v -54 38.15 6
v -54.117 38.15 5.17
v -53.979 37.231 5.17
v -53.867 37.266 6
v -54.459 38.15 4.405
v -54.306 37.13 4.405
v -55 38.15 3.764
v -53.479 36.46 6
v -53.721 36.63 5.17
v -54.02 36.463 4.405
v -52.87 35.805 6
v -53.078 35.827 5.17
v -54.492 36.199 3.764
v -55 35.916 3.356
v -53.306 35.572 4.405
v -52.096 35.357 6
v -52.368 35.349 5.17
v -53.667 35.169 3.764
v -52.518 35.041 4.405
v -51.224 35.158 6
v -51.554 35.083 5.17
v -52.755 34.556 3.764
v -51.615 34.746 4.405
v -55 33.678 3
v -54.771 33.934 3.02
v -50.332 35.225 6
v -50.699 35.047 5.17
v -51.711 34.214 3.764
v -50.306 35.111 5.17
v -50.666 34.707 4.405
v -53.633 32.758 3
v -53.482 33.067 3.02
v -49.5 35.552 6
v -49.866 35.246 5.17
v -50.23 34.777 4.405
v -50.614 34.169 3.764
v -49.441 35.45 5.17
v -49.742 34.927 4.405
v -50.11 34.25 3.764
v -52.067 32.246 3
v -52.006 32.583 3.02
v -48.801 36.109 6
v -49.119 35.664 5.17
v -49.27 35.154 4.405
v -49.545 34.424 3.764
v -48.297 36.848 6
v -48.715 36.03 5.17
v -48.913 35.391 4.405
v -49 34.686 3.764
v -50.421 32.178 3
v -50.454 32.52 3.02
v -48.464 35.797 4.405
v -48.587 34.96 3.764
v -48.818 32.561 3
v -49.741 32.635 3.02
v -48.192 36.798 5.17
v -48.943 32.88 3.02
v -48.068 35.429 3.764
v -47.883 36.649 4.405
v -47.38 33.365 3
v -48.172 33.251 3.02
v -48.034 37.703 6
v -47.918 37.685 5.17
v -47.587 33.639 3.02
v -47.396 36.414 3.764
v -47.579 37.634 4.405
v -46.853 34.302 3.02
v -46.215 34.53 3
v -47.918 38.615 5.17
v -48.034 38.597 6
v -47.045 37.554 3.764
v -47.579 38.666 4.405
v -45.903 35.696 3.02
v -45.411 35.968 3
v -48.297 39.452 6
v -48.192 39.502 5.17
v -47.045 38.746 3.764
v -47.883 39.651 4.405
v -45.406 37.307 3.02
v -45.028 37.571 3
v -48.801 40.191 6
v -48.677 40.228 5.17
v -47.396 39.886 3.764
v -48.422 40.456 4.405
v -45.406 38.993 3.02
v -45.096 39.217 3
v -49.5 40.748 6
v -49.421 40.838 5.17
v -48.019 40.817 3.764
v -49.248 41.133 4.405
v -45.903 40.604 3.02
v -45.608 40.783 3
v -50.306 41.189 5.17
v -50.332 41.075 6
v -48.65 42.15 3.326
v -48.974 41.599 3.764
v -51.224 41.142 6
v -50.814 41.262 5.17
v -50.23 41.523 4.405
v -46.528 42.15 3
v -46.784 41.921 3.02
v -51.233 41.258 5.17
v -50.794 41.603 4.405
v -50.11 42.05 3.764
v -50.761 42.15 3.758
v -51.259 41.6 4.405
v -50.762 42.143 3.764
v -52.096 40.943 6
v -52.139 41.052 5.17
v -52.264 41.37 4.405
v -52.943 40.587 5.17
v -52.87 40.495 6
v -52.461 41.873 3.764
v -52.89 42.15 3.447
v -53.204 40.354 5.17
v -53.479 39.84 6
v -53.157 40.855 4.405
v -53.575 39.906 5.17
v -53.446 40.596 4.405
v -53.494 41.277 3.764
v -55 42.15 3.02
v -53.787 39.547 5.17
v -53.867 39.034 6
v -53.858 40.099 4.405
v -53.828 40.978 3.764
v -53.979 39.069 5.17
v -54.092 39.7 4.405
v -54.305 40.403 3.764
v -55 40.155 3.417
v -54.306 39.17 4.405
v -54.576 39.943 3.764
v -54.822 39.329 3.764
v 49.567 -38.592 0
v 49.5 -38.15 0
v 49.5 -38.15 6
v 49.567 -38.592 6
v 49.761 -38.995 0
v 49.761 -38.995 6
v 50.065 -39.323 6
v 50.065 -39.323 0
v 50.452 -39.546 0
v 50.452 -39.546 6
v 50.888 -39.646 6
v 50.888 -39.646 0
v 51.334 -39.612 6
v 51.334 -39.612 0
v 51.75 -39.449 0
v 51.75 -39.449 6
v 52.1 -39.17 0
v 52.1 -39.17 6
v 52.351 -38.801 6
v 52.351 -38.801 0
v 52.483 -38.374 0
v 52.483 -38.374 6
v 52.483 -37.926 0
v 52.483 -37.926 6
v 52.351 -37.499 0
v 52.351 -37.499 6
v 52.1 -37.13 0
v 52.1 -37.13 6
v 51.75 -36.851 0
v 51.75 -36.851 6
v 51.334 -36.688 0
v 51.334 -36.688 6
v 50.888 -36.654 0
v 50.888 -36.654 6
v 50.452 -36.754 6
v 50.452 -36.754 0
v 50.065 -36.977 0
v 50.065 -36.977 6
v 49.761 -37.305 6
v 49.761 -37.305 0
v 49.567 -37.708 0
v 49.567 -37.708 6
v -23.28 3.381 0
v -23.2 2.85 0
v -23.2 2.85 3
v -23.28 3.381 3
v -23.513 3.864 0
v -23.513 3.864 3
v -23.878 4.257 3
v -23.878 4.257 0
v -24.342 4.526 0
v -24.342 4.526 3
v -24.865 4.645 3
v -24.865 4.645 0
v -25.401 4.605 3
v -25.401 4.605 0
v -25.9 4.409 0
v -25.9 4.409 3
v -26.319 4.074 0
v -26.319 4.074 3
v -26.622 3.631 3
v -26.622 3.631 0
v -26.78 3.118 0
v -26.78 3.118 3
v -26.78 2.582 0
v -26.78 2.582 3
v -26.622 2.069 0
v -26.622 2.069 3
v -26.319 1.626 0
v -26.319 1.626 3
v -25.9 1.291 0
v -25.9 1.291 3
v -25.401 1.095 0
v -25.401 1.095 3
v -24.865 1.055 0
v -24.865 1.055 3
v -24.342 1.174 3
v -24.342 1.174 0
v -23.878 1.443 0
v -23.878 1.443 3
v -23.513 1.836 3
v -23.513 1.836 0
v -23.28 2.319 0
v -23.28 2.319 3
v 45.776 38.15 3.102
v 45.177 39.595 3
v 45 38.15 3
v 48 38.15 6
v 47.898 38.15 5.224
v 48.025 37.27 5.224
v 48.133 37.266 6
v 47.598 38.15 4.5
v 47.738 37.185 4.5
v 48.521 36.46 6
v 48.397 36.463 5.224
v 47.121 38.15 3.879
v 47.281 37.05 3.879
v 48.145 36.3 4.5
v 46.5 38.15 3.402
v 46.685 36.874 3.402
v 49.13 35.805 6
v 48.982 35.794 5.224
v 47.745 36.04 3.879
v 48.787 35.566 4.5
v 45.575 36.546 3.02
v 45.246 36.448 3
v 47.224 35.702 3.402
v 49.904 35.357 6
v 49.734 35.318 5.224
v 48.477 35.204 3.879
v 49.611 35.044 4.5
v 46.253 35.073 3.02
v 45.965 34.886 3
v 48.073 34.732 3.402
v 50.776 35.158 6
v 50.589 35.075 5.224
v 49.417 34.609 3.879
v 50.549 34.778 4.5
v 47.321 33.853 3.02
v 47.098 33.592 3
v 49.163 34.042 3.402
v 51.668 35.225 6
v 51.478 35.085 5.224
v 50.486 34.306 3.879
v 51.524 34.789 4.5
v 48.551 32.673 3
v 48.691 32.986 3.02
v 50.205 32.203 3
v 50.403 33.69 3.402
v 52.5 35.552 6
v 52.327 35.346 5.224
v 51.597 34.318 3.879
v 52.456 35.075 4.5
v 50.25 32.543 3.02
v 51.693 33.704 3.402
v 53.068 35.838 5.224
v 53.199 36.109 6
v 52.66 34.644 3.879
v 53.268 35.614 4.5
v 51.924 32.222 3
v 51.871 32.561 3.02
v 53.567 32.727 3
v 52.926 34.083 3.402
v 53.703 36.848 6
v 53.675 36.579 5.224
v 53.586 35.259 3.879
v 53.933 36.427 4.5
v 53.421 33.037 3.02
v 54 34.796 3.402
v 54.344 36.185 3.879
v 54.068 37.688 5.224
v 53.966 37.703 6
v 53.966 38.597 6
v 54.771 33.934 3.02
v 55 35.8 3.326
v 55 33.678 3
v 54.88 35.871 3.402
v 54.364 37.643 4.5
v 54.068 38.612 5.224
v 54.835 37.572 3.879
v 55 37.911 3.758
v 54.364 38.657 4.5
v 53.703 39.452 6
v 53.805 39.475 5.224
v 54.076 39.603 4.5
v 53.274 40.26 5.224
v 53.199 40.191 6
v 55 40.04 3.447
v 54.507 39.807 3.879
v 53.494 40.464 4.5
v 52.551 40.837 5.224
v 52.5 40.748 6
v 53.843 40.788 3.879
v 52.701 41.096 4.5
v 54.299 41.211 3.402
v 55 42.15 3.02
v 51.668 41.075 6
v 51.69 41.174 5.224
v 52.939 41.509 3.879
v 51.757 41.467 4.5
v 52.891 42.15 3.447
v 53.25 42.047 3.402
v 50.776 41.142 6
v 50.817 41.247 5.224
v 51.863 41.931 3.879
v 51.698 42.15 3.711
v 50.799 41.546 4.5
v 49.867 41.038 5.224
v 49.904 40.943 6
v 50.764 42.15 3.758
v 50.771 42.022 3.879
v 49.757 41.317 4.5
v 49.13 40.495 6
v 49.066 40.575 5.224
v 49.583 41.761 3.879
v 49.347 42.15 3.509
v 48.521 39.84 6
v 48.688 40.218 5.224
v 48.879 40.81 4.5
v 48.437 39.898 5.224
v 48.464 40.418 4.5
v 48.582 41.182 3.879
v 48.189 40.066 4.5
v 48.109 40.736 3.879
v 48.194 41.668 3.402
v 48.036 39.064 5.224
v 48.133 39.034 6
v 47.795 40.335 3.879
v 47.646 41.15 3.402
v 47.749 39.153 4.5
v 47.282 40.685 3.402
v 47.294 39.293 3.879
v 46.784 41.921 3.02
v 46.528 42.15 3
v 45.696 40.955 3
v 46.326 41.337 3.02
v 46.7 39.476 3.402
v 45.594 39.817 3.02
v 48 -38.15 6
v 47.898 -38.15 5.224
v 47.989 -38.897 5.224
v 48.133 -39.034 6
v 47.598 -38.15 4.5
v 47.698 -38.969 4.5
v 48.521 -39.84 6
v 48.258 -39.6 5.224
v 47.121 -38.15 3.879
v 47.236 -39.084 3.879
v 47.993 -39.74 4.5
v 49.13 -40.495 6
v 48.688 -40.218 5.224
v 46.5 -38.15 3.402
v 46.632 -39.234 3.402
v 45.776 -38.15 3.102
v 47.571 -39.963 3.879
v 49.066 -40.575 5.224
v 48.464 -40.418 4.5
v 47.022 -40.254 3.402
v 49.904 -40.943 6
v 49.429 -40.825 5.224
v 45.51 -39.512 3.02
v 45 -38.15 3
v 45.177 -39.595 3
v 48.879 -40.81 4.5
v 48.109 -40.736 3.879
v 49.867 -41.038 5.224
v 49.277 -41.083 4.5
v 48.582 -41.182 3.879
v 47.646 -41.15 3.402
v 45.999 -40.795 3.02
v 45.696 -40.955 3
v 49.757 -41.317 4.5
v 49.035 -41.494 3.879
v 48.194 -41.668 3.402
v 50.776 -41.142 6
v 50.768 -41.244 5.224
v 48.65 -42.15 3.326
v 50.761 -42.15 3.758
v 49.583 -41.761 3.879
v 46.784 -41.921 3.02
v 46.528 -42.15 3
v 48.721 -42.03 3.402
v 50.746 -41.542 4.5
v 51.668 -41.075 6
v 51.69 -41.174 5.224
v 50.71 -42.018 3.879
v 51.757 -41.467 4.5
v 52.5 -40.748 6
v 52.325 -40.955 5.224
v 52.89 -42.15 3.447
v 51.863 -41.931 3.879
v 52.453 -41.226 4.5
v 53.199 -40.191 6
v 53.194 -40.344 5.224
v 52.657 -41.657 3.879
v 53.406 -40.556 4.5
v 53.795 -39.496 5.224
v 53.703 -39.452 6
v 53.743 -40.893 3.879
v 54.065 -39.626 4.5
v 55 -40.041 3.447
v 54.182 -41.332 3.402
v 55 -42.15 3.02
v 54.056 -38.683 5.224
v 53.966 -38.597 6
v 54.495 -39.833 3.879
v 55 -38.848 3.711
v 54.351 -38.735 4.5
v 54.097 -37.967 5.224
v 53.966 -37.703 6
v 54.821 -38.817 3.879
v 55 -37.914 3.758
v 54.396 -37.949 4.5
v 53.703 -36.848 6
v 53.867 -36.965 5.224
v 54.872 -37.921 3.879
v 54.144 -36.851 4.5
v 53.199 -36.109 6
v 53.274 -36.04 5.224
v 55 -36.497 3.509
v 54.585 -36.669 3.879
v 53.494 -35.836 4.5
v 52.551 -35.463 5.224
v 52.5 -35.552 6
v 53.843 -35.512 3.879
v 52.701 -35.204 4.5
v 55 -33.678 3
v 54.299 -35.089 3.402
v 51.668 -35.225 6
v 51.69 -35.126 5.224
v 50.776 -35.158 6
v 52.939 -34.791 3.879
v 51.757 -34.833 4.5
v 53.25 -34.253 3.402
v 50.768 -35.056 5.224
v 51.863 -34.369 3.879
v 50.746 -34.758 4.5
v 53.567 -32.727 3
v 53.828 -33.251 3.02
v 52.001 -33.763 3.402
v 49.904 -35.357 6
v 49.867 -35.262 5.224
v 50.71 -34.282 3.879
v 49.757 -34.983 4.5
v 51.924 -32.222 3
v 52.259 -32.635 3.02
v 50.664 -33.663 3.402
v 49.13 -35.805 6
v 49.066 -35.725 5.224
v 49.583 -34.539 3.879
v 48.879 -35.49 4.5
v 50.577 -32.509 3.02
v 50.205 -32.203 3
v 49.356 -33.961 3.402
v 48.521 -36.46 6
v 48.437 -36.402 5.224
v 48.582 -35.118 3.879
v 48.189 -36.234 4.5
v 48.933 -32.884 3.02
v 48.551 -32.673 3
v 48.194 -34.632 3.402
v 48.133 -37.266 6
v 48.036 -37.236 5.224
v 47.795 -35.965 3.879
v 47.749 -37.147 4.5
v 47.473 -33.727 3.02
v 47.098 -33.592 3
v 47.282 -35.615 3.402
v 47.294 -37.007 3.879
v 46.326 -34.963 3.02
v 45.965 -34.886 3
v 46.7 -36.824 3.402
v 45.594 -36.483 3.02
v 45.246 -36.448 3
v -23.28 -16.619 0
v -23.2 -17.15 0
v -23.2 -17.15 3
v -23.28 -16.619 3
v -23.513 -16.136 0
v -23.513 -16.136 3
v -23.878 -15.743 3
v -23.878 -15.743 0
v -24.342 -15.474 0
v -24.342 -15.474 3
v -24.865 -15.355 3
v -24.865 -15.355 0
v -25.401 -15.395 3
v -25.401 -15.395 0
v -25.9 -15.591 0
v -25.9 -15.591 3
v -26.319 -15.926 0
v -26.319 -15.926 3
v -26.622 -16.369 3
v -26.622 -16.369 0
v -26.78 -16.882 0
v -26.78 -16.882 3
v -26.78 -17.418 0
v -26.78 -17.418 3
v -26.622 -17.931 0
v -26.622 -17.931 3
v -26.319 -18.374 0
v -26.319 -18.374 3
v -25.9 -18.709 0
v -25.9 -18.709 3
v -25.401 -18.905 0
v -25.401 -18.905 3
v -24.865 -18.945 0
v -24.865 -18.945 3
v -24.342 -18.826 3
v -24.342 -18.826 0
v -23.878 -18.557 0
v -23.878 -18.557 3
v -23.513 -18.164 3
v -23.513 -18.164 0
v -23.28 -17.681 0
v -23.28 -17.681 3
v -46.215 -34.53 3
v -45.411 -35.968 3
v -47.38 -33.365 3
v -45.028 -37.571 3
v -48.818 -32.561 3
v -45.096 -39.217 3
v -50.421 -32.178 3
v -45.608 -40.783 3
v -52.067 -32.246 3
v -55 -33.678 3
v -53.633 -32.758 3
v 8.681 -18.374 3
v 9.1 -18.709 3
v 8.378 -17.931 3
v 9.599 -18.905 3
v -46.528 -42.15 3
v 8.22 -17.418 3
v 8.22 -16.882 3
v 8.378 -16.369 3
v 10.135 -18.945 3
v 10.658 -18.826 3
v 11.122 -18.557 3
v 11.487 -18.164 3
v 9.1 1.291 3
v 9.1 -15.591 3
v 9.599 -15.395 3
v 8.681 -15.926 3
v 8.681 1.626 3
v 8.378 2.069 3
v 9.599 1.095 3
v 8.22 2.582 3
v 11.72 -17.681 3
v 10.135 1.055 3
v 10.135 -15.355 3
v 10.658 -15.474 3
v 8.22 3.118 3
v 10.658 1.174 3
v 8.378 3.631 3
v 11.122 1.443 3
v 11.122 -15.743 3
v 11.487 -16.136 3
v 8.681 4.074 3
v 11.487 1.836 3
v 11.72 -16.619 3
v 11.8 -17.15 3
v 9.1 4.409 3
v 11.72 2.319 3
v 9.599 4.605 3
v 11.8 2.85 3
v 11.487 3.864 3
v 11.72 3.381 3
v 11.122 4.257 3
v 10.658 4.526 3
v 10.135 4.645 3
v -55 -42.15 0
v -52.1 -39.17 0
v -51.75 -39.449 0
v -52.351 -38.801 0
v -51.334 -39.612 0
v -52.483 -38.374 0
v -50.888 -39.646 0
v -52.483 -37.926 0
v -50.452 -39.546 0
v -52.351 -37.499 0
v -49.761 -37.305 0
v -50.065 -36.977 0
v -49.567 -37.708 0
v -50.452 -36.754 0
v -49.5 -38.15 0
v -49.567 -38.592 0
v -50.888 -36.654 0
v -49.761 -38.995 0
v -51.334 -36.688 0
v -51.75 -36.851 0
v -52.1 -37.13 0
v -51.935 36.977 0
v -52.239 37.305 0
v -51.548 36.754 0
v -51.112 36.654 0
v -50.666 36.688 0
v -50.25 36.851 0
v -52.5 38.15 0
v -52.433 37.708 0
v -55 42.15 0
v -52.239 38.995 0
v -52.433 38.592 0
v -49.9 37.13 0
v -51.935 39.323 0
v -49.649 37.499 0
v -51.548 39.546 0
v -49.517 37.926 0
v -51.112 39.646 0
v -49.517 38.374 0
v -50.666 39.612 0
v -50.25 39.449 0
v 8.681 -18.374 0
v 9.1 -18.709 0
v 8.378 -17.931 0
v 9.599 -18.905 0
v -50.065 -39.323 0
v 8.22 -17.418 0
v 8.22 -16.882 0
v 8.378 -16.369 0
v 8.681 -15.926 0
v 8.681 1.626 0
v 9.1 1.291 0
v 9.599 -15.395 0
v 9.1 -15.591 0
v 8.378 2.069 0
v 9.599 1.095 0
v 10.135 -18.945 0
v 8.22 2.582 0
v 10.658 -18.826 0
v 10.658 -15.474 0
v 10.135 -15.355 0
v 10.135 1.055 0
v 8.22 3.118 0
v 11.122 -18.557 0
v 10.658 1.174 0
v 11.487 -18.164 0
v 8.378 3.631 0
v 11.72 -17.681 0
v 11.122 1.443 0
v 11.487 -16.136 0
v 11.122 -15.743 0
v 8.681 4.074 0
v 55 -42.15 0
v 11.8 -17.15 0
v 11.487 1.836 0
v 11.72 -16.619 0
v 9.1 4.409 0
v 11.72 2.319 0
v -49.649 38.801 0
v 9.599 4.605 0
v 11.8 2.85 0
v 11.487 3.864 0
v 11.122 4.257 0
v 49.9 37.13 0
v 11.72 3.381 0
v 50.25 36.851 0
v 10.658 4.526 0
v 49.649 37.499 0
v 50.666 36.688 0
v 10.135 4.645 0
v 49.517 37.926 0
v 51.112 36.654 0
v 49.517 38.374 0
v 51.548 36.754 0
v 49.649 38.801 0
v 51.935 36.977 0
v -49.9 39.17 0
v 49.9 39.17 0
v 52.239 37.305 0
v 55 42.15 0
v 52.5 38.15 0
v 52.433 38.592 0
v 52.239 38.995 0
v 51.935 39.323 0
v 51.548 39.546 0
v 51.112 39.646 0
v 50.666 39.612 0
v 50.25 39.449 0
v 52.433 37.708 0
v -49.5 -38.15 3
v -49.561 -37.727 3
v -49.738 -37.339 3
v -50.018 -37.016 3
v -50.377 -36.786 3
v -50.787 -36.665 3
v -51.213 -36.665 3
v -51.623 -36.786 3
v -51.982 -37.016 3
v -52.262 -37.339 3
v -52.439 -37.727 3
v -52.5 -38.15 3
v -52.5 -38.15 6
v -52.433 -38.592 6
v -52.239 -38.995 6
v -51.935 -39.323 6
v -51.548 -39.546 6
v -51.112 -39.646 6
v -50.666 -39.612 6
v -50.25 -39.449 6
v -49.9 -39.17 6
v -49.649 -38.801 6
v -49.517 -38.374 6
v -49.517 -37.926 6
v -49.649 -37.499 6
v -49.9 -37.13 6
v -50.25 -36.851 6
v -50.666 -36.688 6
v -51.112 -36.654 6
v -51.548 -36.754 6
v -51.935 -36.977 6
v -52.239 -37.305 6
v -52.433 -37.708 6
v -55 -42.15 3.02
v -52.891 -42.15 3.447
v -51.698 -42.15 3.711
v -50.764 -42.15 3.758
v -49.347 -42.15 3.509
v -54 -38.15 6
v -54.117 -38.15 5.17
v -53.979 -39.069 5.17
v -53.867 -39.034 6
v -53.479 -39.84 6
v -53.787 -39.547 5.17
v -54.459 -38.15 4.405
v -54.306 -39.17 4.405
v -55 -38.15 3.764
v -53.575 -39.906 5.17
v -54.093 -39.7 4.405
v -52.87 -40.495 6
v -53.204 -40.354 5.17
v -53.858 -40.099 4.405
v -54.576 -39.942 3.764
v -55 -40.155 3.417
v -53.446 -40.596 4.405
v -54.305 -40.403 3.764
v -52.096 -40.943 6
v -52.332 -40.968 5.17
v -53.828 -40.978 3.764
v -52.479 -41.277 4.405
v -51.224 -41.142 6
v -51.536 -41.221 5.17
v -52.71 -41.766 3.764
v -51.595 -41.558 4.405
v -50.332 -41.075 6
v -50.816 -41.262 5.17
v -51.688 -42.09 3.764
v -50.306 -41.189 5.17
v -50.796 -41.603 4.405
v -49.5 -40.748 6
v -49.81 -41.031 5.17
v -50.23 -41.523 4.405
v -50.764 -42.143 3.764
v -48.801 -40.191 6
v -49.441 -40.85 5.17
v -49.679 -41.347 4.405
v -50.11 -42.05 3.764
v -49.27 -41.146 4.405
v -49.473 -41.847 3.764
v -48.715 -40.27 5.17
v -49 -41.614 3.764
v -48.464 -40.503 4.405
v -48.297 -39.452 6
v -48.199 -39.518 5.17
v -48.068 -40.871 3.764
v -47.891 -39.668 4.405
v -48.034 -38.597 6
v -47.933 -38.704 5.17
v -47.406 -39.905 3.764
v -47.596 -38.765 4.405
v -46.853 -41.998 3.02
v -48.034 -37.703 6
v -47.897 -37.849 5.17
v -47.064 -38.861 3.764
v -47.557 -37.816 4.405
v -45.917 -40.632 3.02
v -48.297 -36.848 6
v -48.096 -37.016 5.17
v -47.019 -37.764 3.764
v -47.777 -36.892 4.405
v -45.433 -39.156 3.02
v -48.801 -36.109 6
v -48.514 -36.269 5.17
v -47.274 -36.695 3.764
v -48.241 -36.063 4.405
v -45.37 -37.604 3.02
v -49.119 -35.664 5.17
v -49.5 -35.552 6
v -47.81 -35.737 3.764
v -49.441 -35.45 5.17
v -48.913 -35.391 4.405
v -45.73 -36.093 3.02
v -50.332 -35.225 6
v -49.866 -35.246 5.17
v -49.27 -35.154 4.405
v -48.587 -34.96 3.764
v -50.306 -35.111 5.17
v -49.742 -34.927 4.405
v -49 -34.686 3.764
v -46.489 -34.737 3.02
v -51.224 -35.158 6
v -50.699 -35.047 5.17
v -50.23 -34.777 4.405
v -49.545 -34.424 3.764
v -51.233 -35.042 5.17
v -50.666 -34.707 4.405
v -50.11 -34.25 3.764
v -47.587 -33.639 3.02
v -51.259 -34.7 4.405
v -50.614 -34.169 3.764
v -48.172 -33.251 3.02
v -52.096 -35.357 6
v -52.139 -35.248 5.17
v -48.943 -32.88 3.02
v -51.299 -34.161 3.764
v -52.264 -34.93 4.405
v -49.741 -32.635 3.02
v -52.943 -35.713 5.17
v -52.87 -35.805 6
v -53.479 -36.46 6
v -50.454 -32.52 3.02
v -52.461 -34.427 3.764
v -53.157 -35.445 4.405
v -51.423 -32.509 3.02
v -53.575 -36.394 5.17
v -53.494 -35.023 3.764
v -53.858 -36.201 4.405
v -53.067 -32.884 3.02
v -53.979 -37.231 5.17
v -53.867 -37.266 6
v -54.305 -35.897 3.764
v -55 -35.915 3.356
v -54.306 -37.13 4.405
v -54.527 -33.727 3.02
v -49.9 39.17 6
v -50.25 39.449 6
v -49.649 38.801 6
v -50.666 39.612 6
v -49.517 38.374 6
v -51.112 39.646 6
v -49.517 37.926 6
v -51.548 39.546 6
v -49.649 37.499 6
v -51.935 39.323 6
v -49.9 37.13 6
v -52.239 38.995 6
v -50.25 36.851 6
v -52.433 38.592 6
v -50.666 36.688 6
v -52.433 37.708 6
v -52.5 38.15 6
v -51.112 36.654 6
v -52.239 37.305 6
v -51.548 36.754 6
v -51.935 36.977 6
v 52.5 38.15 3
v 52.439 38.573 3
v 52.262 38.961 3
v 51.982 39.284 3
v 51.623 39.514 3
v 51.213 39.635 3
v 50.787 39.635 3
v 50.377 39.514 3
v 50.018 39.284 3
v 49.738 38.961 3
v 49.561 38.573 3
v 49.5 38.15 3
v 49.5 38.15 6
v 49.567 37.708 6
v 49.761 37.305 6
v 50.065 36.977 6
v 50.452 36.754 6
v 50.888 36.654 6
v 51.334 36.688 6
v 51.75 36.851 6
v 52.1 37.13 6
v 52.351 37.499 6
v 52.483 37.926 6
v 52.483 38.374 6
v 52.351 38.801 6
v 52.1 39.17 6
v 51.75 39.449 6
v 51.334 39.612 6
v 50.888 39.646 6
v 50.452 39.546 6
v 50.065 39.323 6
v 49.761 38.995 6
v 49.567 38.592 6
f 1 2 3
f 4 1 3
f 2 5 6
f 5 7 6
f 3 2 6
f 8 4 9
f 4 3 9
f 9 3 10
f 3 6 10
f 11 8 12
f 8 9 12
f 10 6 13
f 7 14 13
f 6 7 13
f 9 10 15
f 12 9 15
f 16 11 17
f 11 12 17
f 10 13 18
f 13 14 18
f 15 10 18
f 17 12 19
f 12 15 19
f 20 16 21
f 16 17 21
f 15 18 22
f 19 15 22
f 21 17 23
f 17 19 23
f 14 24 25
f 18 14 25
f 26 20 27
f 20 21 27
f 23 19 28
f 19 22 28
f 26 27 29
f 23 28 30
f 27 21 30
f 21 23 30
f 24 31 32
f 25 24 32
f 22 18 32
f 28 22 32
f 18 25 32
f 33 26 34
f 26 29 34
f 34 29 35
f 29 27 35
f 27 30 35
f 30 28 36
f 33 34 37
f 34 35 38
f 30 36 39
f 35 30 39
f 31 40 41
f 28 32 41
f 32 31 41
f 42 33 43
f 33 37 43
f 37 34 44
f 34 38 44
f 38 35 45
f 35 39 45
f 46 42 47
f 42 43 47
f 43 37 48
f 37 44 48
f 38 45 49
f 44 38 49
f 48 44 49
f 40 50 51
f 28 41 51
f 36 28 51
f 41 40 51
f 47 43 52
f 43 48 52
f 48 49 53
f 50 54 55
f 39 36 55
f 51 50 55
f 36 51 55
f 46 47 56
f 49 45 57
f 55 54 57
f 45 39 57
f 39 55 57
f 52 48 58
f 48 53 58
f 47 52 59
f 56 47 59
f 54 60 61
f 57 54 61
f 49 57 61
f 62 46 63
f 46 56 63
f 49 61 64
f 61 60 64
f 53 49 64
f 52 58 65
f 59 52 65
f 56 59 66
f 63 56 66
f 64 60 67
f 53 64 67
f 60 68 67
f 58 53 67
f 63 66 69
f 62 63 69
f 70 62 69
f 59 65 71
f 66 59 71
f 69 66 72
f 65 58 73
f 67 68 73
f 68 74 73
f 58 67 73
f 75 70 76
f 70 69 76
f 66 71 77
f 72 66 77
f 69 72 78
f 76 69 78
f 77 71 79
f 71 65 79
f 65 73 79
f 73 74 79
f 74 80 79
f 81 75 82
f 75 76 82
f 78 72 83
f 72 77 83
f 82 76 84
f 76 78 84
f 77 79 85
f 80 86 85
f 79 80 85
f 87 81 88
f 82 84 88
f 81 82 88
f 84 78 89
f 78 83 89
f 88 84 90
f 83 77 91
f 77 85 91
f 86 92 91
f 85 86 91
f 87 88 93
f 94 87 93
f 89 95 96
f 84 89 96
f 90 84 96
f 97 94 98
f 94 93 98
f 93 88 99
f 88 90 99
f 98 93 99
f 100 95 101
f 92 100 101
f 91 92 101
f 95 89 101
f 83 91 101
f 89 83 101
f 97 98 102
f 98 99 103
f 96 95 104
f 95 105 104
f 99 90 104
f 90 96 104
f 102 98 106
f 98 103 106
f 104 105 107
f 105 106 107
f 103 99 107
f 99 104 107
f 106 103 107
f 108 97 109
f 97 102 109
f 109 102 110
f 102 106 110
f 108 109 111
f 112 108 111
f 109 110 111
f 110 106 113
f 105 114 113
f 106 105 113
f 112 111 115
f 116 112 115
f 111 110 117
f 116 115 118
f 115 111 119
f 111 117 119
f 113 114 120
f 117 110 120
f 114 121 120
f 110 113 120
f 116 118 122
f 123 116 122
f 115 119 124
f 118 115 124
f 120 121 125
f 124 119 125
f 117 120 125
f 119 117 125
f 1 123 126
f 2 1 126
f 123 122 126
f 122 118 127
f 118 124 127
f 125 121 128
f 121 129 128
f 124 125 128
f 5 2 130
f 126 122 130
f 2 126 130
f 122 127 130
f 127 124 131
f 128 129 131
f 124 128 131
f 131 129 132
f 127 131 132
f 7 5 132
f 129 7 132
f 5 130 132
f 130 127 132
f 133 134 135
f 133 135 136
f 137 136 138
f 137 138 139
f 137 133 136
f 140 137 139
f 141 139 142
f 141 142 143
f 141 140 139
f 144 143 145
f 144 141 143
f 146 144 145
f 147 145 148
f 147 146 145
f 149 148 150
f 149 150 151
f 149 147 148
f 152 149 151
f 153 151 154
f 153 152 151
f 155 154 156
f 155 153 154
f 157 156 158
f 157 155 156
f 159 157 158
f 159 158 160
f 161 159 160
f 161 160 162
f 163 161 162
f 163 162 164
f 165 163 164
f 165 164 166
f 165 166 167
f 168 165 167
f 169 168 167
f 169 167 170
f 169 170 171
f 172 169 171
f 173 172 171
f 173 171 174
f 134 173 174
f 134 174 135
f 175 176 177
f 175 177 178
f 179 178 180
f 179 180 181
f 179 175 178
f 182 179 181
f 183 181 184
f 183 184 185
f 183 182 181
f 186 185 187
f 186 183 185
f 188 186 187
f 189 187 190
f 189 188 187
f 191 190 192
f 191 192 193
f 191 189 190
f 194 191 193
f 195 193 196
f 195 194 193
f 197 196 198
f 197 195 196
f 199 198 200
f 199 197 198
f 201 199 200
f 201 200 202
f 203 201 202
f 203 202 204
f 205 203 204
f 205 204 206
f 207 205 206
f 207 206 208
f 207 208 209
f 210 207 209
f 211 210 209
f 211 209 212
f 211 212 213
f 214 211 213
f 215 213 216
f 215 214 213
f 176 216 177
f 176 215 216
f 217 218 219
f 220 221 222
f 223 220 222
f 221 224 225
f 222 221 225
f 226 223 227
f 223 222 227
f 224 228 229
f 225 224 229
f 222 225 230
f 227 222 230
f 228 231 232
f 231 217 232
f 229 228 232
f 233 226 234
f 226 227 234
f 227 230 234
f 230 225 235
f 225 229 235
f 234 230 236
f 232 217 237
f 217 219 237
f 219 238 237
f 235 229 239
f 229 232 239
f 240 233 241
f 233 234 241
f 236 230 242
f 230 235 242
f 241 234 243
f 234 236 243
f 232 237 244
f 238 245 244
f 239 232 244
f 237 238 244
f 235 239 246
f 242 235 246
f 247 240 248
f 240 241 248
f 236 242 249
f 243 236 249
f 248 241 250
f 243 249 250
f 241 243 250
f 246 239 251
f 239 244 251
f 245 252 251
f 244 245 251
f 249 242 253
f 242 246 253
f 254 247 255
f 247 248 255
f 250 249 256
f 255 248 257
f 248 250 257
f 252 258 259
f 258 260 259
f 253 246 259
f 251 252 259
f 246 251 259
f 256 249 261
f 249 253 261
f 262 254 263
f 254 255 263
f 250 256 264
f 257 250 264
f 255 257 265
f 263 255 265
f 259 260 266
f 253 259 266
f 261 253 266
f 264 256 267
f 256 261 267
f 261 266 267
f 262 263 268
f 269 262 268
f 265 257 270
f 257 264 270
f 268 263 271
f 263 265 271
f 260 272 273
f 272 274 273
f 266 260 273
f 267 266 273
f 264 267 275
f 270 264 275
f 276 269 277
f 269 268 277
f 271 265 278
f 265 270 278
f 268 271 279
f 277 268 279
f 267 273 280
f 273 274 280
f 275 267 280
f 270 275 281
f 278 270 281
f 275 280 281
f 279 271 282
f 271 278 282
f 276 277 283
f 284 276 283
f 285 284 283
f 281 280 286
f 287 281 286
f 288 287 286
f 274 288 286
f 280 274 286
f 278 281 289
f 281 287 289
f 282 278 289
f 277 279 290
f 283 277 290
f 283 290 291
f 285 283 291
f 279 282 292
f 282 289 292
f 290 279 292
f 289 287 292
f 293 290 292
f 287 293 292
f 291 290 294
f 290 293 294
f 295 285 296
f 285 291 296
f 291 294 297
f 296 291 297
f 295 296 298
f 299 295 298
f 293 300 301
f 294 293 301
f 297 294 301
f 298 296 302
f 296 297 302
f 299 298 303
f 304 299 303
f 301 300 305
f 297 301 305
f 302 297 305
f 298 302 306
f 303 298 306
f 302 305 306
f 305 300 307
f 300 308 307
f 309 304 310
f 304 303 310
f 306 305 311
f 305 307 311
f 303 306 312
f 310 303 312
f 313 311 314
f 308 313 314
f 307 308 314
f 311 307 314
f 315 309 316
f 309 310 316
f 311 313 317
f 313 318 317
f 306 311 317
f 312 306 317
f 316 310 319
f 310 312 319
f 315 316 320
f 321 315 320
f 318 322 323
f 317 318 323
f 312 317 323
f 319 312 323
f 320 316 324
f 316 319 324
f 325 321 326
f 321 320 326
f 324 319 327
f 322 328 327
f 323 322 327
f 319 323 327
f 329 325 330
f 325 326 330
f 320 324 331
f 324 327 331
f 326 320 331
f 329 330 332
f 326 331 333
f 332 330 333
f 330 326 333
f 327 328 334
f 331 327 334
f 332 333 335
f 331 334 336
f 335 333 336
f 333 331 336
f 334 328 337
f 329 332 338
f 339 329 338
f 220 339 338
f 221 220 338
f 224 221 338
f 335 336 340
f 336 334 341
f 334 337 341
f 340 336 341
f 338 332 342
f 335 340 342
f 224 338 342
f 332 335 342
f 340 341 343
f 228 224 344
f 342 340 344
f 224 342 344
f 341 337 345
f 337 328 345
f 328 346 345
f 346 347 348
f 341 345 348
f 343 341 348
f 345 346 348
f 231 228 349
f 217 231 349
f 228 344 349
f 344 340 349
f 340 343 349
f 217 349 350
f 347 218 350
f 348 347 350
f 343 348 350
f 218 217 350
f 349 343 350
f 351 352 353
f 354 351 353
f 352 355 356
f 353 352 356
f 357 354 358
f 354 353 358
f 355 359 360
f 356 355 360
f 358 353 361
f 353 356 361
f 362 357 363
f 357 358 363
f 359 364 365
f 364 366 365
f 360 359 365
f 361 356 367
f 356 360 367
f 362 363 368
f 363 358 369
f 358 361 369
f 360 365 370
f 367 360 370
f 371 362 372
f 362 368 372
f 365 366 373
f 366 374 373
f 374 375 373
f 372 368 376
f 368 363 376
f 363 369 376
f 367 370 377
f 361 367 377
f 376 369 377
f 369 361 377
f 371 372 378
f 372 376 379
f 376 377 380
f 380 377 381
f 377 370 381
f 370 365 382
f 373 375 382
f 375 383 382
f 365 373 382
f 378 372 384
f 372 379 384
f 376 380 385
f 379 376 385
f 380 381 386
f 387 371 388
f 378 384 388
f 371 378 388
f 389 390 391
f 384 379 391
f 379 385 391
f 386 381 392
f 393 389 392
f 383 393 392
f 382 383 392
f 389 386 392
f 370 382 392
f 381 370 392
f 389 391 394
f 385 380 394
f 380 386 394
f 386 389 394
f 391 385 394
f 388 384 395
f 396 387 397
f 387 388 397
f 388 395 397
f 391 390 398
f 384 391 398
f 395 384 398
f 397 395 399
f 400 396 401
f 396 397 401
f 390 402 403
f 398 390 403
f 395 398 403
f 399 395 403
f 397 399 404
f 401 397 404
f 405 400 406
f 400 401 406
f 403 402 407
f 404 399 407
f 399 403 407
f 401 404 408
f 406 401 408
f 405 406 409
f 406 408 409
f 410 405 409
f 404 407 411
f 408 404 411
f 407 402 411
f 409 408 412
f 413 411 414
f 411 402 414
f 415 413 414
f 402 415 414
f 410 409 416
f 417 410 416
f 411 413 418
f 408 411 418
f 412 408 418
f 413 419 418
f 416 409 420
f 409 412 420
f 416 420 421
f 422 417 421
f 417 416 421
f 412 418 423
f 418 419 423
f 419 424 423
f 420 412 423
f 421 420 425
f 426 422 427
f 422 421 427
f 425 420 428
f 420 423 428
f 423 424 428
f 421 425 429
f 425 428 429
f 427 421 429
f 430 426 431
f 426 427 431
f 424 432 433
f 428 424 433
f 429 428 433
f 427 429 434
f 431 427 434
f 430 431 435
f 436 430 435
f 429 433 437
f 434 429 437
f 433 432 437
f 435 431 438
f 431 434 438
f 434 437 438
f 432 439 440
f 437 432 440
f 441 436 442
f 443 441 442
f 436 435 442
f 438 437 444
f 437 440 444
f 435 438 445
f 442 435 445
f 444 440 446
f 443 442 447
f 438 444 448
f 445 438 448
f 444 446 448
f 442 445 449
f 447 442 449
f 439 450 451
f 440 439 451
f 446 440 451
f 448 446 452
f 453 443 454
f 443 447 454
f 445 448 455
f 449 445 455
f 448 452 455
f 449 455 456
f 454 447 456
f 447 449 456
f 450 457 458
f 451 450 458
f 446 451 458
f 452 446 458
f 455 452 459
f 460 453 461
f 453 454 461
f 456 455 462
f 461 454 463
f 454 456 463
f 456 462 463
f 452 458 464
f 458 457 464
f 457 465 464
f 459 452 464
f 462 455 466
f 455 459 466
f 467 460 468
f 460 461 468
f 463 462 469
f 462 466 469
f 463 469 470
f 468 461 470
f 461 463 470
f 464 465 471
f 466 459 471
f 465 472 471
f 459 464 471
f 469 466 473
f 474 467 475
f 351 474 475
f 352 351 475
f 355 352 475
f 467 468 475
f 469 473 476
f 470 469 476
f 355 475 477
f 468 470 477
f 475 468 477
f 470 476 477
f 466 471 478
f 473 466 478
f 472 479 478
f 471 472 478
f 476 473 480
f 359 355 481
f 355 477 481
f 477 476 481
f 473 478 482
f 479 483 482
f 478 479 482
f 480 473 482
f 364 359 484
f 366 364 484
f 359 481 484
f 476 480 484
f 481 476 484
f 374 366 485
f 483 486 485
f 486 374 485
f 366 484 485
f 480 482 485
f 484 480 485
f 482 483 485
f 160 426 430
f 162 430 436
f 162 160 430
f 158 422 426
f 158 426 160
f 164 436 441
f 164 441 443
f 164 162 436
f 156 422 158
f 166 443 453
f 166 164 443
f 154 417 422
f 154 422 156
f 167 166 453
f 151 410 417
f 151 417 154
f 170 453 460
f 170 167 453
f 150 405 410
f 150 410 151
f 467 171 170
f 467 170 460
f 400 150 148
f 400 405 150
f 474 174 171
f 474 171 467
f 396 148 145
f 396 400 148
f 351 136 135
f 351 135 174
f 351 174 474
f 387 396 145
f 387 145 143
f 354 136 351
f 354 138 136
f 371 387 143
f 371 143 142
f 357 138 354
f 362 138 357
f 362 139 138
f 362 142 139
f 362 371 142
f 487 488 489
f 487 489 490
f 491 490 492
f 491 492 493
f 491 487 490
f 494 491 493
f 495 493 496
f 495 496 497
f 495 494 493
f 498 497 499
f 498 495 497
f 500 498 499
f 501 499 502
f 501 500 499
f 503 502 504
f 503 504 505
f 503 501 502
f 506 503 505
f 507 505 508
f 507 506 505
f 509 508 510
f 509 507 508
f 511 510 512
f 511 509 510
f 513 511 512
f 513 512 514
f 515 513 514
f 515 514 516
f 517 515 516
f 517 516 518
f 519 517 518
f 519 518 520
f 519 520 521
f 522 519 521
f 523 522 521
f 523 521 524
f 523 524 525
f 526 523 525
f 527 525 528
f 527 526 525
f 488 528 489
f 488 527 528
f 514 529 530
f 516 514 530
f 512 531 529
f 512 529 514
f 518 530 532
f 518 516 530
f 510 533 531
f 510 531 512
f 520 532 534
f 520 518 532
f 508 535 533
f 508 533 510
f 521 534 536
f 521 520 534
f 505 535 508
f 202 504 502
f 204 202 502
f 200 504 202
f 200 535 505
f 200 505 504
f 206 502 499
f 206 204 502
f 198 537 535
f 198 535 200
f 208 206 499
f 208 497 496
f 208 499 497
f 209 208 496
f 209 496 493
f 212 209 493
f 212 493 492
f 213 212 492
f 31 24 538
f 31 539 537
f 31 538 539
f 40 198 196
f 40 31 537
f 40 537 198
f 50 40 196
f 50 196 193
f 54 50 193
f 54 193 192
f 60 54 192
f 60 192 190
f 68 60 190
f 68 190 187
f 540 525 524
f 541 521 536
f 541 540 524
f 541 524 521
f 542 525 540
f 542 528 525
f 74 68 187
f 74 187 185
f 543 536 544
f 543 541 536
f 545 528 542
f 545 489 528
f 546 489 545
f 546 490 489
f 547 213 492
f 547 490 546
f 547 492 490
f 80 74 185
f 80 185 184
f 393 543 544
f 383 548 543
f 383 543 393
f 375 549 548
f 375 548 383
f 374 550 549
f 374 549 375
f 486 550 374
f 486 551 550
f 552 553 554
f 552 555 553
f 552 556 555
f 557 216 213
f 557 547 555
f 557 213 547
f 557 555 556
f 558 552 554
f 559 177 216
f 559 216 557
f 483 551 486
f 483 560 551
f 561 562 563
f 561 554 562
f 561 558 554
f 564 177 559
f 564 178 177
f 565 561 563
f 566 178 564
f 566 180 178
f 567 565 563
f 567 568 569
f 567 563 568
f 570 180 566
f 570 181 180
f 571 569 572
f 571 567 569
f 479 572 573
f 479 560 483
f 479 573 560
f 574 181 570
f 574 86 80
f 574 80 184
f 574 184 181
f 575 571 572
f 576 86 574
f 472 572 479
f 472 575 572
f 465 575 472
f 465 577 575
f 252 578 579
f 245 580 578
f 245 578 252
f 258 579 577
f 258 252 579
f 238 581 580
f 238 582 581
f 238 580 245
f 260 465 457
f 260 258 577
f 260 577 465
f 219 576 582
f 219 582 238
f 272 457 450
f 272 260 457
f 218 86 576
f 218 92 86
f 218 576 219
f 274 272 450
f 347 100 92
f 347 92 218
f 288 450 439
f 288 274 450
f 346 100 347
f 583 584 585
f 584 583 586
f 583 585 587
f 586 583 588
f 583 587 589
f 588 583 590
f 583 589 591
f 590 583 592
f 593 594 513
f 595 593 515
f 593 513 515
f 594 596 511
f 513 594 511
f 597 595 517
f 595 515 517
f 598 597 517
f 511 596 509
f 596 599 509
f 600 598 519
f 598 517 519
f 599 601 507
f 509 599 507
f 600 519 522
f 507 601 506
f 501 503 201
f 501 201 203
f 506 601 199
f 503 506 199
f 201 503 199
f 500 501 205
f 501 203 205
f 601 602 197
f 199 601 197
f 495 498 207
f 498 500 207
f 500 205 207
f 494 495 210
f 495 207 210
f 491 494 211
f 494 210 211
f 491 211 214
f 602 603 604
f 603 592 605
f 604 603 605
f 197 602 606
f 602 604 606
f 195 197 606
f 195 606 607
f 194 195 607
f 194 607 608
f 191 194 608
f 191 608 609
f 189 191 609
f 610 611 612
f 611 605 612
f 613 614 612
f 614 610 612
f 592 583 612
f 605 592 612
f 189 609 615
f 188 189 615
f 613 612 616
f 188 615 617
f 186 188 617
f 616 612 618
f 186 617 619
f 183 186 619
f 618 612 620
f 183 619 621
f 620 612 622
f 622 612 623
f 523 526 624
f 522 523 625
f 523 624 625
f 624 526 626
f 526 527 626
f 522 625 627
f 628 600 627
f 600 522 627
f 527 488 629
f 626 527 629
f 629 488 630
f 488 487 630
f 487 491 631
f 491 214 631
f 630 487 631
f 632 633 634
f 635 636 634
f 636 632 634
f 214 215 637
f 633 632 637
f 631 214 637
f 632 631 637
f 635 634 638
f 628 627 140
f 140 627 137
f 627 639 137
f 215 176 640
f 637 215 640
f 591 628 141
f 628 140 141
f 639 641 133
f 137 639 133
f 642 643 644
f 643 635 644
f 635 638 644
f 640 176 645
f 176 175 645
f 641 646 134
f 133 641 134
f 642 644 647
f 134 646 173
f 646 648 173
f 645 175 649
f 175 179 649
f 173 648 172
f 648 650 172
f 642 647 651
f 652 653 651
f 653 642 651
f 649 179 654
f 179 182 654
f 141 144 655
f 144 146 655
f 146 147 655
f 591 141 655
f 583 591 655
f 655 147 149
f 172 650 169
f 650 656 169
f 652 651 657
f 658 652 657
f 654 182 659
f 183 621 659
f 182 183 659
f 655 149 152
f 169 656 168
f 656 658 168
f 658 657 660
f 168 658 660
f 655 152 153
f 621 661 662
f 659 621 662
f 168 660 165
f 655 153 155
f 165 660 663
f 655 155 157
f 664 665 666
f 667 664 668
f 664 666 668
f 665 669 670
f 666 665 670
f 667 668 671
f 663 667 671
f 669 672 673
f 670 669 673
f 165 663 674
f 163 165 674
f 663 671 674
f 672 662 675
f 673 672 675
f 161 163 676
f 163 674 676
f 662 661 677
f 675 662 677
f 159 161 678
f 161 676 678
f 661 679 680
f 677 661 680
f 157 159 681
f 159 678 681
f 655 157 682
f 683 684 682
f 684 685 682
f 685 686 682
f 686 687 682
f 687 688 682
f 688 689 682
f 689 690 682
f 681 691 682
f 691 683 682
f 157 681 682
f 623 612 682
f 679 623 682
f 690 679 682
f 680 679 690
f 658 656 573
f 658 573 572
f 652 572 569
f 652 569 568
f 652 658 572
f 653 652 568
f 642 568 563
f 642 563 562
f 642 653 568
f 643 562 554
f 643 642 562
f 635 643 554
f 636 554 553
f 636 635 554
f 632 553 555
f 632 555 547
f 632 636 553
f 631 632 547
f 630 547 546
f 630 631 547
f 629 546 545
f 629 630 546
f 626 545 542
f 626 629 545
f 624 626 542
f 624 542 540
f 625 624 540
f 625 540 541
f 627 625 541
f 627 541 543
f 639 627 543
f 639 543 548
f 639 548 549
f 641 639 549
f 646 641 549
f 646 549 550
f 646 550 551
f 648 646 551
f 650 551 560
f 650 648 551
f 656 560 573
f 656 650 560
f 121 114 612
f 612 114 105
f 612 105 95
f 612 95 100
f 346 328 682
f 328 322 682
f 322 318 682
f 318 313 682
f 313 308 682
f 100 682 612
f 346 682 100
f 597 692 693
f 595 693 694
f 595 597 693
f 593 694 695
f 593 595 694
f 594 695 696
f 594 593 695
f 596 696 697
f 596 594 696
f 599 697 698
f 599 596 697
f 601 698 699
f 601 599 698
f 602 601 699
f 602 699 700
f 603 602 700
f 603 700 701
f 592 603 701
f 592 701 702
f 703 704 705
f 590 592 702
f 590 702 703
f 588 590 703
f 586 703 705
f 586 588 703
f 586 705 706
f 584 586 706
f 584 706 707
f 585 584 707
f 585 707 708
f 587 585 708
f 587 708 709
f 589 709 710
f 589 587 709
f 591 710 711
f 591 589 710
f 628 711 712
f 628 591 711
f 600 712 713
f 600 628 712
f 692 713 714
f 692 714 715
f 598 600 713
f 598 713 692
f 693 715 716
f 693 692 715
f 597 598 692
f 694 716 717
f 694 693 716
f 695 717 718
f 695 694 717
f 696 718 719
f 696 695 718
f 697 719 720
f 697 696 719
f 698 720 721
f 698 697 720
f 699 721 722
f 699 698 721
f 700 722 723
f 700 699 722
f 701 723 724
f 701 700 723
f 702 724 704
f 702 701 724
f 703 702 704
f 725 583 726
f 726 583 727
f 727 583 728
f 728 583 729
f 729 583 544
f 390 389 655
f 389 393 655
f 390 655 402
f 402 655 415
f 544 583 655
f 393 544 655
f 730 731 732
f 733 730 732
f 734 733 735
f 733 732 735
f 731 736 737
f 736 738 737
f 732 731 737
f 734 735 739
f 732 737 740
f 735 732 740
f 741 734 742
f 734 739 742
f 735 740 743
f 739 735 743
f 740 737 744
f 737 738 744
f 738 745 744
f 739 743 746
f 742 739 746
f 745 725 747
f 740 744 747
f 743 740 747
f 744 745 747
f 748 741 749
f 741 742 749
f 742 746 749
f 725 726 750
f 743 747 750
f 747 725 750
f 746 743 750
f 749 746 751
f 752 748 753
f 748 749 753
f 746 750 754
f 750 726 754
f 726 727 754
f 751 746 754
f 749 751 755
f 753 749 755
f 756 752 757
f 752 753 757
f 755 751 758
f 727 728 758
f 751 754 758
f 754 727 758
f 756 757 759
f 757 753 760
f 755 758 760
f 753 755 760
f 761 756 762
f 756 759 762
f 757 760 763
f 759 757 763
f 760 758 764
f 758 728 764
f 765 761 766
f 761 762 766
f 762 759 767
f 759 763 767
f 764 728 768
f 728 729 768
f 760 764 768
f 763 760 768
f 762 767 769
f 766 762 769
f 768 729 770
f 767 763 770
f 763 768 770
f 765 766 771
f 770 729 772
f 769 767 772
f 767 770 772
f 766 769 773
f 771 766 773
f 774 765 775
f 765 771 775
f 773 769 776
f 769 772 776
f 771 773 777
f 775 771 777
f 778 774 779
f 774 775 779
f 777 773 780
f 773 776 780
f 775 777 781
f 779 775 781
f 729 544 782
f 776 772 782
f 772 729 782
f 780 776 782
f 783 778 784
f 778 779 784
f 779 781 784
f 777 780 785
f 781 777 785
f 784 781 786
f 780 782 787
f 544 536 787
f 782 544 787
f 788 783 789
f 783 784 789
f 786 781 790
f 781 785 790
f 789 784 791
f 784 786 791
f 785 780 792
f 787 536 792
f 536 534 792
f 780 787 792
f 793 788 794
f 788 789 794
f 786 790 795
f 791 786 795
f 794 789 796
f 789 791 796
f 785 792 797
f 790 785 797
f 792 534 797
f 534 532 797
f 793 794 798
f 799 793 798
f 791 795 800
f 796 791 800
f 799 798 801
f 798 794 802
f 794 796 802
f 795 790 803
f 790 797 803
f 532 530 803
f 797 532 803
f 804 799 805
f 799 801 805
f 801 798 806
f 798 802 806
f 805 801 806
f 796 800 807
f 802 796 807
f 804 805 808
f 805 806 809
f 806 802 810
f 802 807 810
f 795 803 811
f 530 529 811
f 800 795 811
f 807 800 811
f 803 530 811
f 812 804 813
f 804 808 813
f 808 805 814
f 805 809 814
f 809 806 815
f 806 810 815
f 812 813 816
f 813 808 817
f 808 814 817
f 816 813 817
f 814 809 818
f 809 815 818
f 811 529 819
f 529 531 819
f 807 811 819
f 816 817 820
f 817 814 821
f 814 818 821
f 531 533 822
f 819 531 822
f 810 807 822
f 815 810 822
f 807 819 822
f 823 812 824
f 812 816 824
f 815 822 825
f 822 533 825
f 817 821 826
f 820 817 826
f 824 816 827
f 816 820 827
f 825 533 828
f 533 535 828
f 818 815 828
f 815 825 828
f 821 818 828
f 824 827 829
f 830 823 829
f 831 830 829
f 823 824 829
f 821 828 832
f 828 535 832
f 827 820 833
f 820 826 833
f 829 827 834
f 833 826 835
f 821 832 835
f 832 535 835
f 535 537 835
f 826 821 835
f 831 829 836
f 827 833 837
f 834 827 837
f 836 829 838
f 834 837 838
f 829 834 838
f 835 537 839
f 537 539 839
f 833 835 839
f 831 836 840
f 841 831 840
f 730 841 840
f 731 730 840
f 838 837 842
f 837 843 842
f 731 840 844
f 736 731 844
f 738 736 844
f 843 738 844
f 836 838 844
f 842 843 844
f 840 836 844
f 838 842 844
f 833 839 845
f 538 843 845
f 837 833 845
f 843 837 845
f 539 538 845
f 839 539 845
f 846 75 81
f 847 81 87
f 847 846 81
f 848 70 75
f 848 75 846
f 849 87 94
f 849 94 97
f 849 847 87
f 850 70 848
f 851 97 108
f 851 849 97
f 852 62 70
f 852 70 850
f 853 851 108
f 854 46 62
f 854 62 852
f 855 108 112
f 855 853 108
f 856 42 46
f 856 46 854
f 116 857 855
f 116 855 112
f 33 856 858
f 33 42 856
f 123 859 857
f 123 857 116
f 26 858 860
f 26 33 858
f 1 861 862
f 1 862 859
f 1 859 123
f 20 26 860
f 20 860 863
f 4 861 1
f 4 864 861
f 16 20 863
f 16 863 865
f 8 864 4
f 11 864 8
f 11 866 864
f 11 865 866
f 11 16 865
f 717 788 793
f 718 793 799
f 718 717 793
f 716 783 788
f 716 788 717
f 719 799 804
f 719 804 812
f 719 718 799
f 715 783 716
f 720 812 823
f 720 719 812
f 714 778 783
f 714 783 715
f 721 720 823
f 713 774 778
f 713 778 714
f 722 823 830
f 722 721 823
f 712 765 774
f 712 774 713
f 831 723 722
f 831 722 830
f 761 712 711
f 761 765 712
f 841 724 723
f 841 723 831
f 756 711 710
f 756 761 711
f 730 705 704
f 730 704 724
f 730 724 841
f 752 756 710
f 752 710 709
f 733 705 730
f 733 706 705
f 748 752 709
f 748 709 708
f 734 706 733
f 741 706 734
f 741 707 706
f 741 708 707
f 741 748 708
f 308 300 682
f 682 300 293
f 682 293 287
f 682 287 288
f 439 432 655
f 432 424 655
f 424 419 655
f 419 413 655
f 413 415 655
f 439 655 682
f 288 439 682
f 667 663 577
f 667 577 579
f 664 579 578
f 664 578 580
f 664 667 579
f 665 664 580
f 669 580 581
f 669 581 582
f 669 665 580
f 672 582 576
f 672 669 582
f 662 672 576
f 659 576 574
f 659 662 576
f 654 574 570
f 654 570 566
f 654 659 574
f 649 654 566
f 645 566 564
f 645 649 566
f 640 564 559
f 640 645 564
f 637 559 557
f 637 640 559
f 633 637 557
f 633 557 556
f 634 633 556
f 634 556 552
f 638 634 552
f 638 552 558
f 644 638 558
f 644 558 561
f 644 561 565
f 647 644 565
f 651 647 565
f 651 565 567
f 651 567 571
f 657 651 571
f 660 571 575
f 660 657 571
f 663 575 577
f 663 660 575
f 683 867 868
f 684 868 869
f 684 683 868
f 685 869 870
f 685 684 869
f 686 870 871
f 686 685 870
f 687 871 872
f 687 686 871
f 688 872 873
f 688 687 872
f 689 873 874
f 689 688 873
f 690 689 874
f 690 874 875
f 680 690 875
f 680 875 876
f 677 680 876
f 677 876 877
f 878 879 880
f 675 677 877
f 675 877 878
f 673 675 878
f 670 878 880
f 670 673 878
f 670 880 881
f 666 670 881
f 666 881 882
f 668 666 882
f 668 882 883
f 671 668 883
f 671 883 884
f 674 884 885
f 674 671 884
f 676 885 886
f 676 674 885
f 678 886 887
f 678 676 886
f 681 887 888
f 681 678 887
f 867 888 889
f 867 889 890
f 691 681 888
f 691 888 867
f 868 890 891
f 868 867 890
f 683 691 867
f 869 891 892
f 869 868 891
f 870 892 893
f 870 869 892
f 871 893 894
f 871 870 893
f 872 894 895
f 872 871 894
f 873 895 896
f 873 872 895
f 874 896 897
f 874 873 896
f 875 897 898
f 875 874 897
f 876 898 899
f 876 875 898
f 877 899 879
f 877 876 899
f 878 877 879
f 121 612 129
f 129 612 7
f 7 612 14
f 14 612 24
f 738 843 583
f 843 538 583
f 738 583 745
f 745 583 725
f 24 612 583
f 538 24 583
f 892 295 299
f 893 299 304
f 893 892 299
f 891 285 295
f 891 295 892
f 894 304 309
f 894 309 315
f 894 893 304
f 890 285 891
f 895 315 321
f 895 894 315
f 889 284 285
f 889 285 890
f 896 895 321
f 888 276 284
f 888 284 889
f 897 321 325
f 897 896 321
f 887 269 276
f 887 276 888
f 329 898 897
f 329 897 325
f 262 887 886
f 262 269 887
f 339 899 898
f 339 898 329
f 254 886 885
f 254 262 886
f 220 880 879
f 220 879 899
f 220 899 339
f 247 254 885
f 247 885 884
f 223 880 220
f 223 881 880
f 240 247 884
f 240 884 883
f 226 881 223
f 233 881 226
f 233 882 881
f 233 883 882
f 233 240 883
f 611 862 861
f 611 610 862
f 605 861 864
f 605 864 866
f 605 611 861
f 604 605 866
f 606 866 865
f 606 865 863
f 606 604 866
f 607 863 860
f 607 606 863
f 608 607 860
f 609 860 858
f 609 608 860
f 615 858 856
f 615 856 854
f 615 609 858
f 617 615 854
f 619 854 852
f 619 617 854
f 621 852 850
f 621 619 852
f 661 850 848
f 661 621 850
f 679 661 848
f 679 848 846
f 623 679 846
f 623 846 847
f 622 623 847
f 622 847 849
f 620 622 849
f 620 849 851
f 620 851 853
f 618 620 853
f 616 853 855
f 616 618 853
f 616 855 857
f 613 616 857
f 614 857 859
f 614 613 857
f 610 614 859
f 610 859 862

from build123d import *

# Parameters (mm, degrees)
SKETCH1_W           = 110
SKETCH1_H           = 84.3
SKETCH1_R           = 1.5
SKETCH1_R_2         = 1.8
BOSS_EXTRUDE1_DEPTH = 3
BOSS_EXTRUDE2_START = 3
SKETCH2_R           = 3
SKETCH2_R_2         = 1.5
BOSS_EXTRUDE2_DEPTH = 3
FILLET1_R           = 3


with BuildPart() as part:
    # Sketch1 → Boss-Extrude1 (new body)
    with BuildSketch(Plane.XY):
        Rectangle(SKETCH1_W, SKETCH1_H)
        with Locations((51, 38.15)):
            Circle(SKETCH1_R, mode=Mode.SUBTRACT)
        with Locations(Location((-51, 38.15, 0), (0, 0, 180))):
            Circle(SKETCH1_R, mode=Mode.SUBTRACT)
        with Locations(Location((51, -38.15, 0), (0, 0, 180))):
            Circle(SKETCH1_R, mode=Mode.SUBTRACT)
        with Locations((-51, -38.15)):
            Circle(SKETCH1_R, mode=Mode.SUBTRACT)
        with Locations((-25, -17.15)):
            Circle(SKETCH1_R_2, mode=Mode.SUBTRACT)
        with Locations((-25, 2.85)):
            Circle(SKETCH1_R_2, mode=Mode.SUBTRACT)
        with Locations((10, 2.85)):
            Circle(SKETCH1_R_2, mode=Mode.SUBTRACT)
        with Locations((10, -17.15)):
            Circle(SKETCH1_R_2, mode=Mode.SUBTRACT)
    extrude(amount=BOSS_EXTRUDE1_DEPTH)

    # Sketch2 → Boss-Extrude2 (add)
    # profile 1 of 4: a face of its own
    with BuildSketch(Plane.XY.offset(BOSS_EXTRUDE2_START)):
        with Locations(Location((-51, 38.15, 0), (0, 0, 180))):
            Circle(SKETCH2_R)
        with Locations(Location((-51, 38.15, 0), (0, 0, 180))):
            Circle(SKETCH2_R_2, mode=Mode.SUBTRACT)
    # profile 2 of 4: a face of its own
    with BuildSketch(Plane.XY.offset(BOSS_EXTRUDE2_START)):
        with Locations(Location((51, 38.15, 0), (0, 0, 180))):
            Circle(SKETCH2_R)
        with Locations(Location((51, 38.15, 0), (0, 0, 180))):
            Circle(SKETCH2_R_2, mode=Mode.SUBTRACT)
    # profile 3 of 4: a face of its own
    with BuildSketch(Plane.XY.offset(BOSS_EXTRUDE2_START)):
        with Locations(Location((51, -38.15, 0), (0, 0, 180))):
            Circle(SKETCH2_R)
        with Locations(Location((51, -38.15, 0), (0, 0, 180))):
            Circle(SKETCH2_R_2, mode=Mode.SUBTRACT)
    # profile 4 of 4: a face of its own
    with BuildSketch(Plane.XY.offset(BOSS_EXTRUDE2_START)):
        with Locations(Location((-51, -38.15, 0), (0, 0, 180))):
            Circle(SKETCH2_R)
        with Locations(Location((-51, -38.15, 0), (0, 0, 180))):
            Circle(SKETCH2_R_2, mode=Mode.SUBTRACT)
    extrude(amount=BOSS_EXTRUDE2_DEPTH)

    # Fillet1
    # the kernel refuses this fillet: 3 mm, written as the material it adds along each edge
    with BuildSketch(Plane(origin=(-51, 38.15, 3), x_dir=(-1, 0, 0), z_dir=(0, 1, 0))) as fillet1_piece_1_section:
        with BuildLine():
            CenterArc((3 + FILLET1_R, FILLET1_R), FILLET1_R, 180, 90)
            Line((3, FILLET1_R), (3, 0))
            Line((3, 0), (3 + FILLET1_R, 0))
        make_face()
    fillet1_piece_1 = revolve(axis=Axis((-51, 38.15, 3), (0, 0, 1)), mode=Mode.PRIVATE)
    fillet1_piece_1 = split(fillet1_piece_1, bisect_by=Plane(origin=(-55, 38.15, 3.853016367), z_dir=(1, 0, 0)), keep=Keep.TOP, mode=Mode.PRIVATE)
    fillet1_piece_1 = split(fillet1_piece_1, bisect_by=Plane(origin=(-47.146983633, 42.15, 3.853016367), z_dir=(0, -1, 0)), keep=Keep.TOP, mode=Mode.PRIVATE)
    add(fillet1_piece_1)
    with BuildSketch(Plane(origin=(51, 38.15, 3), x_dir=(-1, 0, 0), z_dir=(0, 1, 0))) as fillet1_piece_2_section:
        with BuildLine():
            CenterArc((3 + FILLET1_R, FILLET1_R), FILLET1_R, 180, 90)
            Line((3, FILLET1_R), (3, 0))
            Line((3, 0), (3 + FILLET1_R, 0))
        make_face()
    fillet1_piece_2 = revolve(axis=Axis((51, 38.15, 3), (0, 0, 1)), mode=Mode.PRIVATE)
    fillet1_piece_2 = split(fillet1_piece_2, bisect_by=Plane(origin=(55, 38.15, 3.853016383), z_dir=(-1, 0, 0)), keep=Keep.TOP, mode=Mode.PRIVATE)
    fillet1_piece_2 = split(fillet1_piece_2, bisect_by=Plane(origin=(54.853016383, 42.15, 3.853016383), z_dir=(0, -1, 0)), keep=Keep.TOP, mode=Mode.PRIVATE)
    add(fillet1_piece_2)
    with BuildSketch(Plane(origin=(51, -38.15, 3), x_dir=(-1, 0, 0), z_dir=(0, 1, 0))) as fillet1_piece_3_section:
        with BuildLine():
            CenterArc((3 + FILLET1_R, FILLET1_R), FILLET1_R, 180, 90)
            Line((3, FILLET1_R), (3, 0))
            Line((3, 0), (3 + FILLET1_R, 0))
        make_face()
    fillet1_piece_3 = revolve(axis=Axis((51, -38.15, 3), (0, 0, 1)), mode=Mode.PRIVATE)
    fillet1_piece_3 = split(fillet1_piece_3, bisect_by=Plane(origin=(54.853016382, -42.15, 3.853016382), z_dir=(0, 1, 0)), keep=Keep.TOP, mode=Mode.PRIVATE)
    fillet1_piece_3 = split(fillet1_piece_3, bisect_by=Plane(origin=(55, -38.15, 3.853016382), z_dir=(-1, 0, 0)), keep=Keep.TOP, mode=Mode.PRIVATE)
    add(fillet1_piece_3)
    with BuildSketch(Plane(origin=(-51, -38.15, 3), x_dir=(-1, 0, 0), z_dir=(0, 1, 0))) as fillet1_piece_4_section:
        with BuildLine():
            CenterArc((3 + FILLET1_R, FILLET1_R), FILLET1_R, 180, 90)
            Line((3, FILLET1_R), (3, 0))
            Line((3, 0), (3 + FILLET1_R, 0))
        make_face()
    fillet1_piece_4 = revolve(axis=Axis((-51, -38.15, 3), (0, 0, 1)), mode=Mode.PRIVATE)
    fillet1_piece_4 = split(fillet1_piece_4, bisect_by=Plane(origin=(-47.146983624, -42.15, 3.853016376), z_dir=(0, 1, 0)), keep=Keep.TOP, mode=Mode.PRIVATE)
    fillet1_piece_4 = split(fillet1_piece_4, bisect_by=Plane(origin=(-55, -38.15, 3.853016376), z_dir=(1, 0, 0)), keep=Keep.TOP, mode=Mode.PRIVATE)
    add(fillet1_piece_4)


solid = part.part
